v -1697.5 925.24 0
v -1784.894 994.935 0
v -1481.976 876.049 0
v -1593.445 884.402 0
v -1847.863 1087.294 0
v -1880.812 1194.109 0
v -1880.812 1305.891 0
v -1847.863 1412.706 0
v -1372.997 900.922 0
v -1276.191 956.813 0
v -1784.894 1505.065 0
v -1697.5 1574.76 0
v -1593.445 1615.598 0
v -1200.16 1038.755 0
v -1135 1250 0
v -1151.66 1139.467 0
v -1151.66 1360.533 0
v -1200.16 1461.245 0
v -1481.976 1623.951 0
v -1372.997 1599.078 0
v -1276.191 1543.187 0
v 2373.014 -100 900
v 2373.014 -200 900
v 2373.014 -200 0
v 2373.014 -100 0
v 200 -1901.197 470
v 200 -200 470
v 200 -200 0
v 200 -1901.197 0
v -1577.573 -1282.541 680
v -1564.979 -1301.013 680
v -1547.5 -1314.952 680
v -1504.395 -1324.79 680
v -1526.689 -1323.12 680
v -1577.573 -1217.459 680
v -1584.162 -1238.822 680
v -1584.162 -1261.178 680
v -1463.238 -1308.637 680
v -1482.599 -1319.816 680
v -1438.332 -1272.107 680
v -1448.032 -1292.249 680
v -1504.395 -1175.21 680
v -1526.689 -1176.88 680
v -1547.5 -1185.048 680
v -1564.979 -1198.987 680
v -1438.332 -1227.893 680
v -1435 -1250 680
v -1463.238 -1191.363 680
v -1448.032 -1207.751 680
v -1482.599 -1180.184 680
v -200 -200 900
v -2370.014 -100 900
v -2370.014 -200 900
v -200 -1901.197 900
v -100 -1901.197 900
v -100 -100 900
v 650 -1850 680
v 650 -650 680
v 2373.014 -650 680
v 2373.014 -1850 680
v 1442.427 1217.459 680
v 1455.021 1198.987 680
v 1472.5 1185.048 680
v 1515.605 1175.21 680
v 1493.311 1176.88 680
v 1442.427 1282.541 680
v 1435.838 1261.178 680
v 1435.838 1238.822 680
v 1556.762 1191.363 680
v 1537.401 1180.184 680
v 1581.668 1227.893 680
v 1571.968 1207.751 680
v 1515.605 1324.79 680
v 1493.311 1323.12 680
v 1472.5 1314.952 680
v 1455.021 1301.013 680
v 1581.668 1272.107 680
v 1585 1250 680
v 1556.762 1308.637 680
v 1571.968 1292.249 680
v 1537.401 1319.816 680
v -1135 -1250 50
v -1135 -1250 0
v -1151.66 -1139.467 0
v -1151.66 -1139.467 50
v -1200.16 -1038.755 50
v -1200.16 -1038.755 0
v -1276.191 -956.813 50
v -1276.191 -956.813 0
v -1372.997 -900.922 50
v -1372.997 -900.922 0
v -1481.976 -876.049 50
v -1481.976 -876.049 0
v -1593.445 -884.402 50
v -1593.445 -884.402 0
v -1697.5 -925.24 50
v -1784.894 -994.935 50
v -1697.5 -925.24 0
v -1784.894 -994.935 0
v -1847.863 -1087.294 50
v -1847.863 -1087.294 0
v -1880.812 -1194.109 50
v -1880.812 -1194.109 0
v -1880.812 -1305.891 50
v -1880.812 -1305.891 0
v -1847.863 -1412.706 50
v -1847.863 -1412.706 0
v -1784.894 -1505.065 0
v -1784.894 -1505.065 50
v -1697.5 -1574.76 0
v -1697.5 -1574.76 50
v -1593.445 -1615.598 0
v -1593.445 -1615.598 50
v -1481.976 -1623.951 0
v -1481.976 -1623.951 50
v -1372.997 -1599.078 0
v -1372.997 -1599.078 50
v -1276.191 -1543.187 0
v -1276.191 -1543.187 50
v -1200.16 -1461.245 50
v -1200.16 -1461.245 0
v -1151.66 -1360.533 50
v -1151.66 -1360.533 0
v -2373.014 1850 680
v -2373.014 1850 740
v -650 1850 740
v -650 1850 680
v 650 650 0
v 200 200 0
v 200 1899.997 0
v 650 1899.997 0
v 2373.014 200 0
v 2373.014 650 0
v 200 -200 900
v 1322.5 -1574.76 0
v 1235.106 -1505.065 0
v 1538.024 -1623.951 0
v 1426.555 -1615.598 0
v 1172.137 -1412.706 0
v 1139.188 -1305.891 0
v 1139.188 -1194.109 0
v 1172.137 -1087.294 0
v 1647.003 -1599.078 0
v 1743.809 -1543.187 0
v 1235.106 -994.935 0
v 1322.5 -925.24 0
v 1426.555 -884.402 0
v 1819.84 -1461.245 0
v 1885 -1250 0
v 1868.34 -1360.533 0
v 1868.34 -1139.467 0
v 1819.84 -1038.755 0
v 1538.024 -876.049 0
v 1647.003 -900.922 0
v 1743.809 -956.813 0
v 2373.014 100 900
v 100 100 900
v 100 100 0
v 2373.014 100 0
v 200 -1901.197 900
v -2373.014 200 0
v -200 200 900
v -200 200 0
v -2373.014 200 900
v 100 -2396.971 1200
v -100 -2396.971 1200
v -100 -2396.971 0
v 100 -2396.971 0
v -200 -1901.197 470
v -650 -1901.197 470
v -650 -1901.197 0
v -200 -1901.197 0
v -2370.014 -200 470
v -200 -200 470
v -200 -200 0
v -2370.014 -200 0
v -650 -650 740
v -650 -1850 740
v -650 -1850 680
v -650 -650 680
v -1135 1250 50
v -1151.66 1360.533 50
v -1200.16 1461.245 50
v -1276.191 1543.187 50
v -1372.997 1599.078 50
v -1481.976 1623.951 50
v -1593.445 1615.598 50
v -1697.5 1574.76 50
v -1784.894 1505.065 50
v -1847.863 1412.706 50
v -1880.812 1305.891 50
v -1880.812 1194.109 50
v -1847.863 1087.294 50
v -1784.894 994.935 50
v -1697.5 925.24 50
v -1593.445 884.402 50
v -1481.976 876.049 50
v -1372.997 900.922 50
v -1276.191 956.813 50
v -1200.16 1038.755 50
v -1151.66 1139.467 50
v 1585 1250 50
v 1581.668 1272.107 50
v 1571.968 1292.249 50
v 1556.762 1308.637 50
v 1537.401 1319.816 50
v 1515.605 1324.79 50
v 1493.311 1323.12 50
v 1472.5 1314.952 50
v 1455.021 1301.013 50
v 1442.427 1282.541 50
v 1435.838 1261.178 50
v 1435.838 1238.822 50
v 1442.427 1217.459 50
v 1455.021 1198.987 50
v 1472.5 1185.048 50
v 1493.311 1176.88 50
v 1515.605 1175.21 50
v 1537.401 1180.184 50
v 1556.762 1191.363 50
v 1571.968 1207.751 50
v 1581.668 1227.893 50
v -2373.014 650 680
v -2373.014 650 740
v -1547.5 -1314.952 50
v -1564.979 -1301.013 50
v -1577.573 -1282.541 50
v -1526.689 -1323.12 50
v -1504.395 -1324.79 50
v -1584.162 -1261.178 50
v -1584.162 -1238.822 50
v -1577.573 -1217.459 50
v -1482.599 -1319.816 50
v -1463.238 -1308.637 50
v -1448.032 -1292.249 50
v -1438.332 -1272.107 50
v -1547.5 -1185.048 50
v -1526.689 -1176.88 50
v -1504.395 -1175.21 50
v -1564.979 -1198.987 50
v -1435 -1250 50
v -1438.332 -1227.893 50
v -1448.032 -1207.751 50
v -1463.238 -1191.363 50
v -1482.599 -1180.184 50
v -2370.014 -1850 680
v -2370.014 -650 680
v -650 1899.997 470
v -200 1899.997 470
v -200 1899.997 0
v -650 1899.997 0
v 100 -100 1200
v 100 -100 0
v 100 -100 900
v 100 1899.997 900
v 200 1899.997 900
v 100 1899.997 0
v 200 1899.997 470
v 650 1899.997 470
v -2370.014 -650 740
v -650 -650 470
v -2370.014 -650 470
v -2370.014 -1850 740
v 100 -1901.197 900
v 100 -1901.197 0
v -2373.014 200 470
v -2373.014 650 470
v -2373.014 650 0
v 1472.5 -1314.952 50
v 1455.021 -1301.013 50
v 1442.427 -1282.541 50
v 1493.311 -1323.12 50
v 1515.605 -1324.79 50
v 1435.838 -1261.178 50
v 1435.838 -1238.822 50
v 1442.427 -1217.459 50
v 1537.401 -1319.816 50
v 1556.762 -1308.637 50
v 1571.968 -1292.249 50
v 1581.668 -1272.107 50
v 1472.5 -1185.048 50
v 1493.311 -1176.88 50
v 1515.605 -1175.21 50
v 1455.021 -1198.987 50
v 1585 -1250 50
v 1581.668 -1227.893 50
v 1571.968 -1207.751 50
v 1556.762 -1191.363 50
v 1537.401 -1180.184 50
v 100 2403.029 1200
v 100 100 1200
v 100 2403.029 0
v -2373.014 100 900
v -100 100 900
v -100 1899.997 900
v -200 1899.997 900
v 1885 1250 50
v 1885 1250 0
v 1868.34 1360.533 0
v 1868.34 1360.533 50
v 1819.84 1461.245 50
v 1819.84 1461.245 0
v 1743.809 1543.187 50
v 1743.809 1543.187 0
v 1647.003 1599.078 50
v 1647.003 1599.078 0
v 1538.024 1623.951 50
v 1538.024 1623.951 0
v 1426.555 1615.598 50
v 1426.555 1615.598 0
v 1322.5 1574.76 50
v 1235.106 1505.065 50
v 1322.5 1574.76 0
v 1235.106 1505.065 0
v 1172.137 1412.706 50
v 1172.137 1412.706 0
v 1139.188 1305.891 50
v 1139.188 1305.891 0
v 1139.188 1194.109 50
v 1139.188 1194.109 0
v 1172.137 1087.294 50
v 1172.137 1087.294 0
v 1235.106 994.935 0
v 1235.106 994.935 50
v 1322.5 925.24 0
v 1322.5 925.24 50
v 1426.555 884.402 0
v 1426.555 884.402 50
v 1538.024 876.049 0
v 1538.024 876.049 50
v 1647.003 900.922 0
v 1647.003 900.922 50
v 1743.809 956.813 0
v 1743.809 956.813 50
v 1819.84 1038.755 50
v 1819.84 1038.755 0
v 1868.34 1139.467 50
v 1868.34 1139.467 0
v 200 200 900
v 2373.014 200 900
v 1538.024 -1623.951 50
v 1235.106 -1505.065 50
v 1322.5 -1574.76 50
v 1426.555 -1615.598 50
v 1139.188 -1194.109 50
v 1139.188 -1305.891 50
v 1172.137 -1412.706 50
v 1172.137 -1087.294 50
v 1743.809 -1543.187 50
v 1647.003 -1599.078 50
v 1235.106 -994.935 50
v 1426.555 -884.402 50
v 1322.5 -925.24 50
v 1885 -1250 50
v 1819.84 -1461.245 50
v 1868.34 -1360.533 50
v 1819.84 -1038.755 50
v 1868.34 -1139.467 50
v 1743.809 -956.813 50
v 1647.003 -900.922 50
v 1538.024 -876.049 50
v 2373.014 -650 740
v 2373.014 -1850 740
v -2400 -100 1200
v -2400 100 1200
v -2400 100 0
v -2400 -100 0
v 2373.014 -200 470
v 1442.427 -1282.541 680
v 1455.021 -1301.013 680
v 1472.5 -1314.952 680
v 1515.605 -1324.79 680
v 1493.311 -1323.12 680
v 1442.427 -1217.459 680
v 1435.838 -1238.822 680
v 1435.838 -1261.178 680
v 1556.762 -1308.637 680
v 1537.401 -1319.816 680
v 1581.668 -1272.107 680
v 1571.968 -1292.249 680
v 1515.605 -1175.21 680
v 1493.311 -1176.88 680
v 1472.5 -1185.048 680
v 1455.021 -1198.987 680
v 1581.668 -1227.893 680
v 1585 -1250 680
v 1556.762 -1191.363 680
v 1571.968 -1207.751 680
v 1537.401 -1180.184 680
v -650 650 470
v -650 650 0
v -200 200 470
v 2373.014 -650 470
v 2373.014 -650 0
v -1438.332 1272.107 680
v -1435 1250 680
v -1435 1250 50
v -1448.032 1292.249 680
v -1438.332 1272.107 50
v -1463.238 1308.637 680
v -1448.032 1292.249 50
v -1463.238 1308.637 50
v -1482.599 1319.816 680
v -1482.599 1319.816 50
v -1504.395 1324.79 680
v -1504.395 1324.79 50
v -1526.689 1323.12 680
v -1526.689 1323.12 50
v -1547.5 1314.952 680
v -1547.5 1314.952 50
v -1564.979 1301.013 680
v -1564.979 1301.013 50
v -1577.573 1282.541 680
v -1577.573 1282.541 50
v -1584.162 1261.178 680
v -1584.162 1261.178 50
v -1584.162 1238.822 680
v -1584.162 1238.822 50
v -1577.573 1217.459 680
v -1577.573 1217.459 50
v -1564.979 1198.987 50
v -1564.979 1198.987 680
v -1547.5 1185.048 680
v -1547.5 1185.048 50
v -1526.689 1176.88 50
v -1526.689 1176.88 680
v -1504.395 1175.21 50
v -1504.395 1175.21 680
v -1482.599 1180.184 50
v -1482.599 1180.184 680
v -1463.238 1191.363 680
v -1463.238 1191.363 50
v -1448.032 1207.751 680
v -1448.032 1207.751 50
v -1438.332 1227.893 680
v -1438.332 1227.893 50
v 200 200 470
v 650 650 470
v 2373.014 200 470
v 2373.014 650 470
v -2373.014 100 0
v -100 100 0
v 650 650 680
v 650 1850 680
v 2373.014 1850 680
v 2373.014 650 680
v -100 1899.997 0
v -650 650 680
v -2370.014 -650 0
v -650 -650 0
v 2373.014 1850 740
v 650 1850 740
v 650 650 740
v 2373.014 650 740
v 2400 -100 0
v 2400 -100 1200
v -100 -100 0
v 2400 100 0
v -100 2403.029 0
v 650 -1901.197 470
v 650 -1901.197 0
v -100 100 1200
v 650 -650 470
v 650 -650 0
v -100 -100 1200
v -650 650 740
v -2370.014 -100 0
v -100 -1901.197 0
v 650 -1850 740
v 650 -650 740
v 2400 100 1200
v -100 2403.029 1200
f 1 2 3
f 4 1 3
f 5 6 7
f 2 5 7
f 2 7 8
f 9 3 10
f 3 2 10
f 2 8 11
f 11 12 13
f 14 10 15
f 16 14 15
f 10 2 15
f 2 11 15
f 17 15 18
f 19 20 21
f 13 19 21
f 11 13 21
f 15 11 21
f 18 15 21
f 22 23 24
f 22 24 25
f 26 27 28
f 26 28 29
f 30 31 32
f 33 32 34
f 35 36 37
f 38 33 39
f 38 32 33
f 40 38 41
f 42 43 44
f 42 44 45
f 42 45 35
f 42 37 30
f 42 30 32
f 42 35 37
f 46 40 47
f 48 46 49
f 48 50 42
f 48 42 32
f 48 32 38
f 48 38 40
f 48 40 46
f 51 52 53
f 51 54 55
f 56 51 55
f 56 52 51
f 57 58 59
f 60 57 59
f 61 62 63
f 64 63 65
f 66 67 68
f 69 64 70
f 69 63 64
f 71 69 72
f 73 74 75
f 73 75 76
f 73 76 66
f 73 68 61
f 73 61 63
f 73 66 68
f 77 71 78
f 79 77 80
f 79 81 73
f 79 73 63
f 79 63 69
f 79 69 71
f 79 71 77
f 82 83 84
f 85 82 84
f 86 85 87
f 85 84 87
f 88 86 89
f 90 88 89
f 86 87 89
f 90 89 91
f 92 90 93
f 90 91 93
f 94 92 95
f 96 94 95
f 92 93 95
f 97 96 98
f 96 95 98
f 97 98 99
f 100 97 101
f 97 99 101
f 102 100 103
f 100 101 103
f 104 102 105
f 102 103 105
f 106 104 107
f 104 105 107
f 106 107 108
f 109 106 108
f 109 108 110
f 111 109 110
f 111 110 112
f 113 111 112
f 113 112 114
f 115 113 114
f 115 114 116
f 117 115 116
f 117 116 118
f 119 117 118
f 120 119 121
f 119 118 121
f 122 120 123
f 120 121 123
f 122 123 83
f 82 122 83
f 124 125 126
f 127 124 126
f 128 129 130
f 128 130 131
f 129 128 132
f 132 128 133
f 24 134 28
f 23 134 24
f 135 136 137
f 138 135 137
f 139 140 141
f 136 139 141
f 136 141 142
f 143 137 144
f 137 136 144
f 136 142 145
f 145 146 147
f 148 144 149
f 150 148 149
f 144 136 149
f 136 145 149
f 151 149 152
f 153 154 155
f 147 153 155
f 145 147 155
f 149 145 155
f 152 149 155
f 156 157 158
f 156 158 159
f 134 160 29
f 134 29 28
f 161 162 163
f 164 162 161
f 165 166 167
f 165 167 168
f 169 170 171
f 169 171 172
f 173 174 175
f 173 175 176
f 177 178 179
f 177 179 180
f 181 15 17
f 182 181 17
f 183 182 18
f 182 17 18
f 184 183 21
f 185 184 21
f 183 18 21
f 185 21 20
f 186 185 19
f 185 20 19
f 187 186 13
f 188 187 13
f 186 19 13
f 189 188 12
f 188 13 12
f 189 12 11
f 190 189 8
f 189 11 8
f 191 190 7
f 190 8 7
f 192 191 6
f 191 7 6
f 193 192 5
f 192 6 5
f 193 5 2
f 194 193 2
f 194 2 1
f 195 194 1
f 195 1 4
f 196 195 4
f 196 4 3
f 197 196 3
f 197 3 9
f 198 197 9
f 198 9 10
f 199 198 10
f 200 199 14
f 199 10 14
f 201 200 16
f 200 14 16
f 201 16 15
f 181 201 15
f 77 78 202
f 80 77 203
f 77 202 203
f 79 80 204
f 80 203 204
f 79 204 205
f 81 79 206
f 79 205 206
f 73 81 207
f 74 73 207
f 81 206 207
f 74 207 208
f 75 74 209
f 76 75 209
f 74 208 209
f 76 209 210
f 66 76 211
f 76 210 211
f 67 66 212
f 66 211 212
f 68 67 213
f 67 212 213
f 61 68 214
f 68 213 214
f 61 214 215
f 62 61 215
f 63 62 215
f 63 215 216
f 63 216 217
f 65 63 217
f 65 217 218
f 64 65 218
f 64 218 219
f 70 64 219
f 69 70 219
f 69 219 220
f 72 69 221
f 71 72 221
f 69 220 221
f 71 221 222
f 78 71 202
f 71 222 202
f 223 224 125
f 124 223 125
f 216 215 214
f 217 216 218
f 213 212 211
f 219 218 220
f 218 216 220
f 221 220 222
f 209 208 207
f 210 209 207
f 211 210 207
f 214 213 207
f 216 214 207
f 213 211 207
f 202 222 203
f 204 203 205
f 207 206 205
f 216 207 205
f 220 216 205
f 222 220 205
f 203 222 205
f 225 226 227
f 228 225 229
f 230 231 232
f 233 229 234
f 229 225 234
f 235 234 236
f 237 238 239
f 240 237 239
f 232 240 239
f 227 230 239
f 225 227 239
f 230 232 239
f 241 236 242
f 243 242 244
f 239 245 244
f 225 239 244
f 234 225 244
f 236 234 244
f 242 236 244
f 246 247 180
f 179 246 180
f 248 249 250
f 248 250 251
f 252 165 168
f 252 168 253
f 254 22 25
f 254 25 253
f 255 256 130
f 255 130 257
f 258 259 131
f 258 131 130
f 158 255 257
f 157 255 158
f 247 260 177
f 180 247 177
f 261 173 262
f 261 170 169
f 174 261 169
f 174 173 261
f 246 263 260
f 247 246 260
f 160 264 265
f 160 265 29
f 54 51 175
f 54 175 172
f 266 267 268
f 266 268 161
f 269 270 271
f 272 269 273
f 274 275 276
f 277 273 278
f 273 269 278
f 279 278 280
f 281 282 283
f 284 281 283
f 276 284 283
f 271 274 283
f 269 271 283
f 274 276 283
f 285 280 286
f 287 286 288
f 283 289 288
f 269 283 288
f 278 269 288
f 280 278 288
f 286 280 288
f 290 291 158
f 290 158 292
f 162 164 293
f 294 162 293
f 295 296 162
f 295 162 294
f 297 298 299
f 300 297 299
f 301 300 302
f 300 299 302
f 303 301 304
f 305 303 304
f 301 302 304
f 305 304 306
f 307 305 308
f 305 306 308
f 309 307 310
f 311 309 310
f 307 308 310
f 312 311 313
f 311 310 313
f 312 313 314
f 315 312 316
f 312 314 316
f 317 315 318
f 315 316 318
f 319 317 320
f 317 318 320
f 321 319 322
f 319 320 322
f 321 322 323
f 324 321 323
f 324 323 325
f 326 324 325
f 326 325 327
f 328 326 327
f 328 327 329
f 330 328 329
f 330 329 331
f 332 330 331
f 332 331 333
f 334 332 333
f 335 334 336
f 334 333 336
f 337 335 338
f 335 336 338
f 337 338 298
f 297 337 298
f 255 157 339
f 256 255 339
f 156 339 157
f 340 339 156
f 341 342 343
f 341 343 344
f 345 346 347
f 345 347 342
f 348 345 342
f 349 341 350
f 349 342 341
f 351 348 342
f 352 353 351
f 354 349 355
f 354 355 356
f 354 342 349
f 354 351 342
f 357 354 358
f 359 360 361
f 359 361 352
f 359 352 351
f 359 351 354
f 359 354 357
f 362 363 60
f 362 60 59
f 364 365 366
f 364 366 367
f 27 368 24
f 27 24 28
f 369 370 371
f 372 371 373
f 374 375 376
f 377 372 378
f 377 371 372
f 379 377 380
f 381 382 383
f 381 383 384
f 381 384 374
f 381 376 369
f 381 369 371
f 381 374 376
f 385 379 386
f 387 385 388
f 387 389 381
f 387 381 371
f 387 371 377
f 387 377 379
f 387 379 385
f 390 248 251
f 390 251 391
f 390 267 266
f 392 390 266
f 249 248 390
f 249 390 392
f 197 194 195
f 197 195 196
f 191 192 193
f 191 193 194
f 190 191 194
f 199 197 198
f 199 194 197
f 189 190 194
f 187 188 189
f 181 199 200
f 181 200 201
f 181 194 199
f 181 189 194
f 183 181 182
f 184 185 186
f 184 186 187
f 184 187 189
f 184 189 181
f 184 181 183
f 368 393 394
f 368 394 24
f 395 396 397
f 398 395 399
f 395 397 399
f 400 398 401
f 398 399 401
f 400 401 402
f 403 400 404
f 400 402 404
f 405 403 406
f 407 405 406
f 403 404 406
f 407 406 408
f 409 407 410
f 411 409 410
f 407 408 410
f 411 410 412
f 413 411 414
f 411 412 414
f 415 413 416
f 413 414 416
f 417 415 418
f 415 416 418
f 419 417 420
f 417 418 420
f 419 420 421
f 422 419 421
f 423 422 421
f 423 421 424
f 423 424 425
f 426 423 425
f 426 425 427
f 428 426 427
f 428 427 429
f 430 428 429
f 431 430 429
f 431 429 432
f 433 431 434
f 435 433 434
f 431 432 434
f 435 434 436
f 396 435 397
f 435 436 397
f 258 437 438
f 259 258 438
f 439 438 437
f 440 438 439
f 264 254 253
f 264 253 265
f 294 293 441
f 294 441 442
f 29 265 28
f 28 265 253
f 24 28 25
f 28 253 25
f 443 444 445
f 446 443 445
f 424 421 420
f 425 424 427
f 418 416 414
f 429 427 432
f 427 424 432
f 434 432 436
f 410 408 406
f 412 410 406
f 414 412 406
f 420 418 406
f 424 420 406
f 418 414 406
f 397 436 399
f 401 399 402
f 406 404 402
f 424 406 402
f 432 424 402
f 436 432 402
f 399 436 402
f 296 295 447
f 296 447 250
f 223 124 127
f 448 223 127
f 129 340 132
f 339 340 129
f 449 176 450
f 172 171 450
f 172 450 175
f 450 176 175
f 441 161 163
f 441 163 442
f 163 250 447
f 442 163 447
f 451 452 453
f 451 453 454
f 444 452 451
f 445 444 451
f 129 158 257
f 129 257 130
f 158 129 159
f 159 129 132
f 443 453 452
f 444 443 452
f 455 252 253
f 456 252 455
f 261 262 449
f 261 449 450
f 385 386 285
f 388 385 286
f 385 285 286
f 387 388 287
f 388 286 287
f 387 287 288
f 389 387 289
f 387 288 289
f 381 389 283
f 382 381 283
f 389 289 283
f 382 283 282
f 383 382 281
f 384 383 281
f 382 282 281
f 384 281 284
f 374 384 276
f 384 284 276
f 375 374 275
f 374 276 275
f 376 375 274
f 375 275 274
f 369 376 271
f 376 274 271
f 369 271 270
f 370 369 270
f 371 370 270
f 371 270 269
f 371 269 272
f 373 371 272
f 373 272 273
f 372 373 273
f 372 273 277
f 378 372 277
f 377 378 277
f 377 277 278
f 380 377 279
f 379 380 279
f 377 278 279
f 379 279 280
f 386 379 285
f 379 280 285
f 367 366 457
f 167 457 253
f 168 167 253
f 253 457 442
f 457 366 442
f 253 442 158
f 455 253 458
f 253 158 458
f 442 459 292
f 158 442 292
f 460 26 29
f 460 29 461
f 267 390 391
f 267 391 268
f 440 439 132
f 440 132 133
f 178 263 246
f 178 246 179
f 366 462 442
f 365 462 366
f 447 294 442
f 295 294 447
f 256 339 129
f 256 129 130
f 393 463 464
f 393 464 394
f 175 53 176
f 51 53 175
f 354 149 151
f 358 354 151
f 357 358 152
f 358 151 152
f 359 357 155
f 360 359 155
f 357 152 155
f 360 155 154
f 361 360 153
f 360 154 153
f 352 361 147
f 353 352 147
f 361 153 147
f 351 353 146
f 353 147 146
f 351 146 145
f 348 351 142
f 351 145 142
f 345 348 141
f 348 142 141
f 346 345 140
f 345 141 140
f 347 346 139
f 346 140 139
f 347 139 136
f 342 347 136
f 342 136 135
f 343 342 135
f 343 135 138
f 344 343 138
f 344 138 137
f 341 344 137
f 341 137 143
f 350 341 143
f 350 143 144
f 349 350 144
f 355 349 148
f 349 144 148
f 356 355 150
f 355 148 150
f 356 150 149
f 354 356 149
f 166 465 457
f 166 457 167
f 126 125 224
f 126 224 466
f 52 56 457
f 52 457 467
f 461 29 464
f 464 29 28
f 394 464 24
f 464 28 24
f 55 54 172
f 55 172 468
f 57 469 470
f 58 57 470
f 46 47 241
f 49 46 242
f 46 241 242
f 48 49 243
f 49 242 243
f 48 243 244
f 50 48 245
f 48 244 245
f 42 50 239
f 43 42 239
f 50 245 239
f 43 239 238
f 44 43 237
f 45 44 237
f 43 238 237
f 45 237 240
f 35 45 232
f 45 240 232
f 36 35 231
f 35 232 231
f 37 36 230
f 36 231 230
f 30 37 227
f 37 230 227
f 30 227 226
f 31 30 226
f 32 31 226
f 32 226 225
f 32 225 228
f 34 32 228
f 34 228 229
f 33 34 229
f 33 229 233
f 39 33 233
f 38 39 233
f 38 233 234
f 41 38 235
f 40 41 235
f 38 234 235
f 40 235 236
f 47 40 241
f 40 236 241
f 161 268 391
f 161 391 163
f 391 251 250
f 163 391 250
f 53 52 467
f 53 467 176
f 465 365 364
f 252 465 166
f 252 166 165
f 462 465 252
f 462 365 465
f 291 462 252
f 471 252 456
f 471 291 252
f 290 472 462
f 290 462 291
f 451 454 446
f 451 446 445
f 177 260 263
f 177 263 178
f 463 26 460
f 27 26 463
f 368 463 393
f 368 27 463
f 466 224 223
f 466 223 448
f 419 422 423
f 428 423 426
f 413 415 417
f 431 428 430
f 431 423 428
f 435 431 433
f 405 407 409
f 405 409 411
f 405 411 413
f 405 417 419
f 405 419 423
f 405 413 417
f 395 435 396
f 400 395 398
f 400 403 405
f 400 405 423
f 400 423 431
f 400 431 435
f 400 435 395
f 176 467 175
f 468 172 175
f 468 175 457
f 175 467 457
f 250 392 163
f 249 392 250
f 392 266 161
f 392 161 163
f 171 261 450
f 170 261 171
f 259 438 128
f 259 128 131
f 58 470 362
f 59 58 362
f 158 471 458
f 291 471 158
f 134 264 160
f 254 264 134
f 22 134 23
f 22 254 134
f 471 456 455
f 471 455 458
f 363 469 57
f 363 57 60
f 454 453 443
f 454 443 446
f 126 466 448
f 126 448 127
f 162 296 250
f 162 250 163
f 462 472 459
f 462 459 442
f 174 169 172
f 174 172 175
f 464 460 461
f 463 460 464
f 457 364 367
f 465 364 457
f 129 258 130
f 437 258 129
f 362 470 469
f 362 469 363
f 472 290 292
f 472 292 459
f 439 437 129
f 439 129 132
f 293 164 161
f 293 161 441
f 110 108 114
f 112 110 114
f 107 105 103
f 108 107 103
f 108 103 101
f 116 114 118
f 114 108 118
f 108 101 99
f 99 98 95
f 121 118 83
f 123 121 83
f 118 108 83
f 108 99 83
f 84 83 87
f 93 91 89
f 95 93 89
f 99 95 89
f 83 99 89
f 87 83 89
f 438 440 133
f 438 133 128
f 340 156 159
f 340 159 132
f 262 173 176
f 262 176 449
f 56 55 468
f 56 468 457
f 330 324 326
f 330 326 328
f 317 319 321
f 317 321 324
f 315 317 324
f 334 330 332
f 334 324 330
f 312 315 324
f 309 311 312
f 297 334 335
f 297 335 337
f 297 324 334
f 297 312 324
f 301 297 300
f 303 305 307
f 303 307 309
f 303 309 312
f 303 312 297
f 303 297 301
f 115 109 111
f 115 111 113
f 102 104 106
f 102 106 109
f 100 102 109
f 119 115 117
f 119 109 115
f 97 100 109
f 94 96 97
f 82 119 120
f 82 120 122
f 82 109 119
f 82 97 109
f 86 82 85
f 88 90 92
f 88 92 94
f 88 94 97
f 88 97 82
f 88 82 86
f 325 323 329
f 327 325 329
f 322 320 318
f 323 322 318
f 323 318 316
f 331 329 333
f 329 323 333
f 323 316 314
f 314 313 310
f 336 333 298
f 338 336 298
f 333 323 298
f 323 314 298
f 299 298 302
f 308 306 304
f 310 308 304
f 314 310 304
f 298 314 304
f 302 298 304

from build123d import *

# Parameters (mm, degrees)
F6_DEPTH  = 470
F8_DEPTH  = 1200
F10_DEPTH = 900
F12_W     = 1723.014453
F12_H     = 1200
F12_W_2   = 1720.014453
F13_DEPTH = 60
F14_R     = 375
F15_DEPTH = 50
F16_R     = 75
F17_DEPTH = 630


with BuildPart() as f6:
    # F5 (on offset) → F6 (new body)
    with BuildSketch(Plane.XY.offset(470)):
        Polygon((-650, 650), (-2373.014453, 650), (-2373.014453, 200), (-200, 200), (-200, 1899.996675), (-650, 1899.996675), align=None)
        Polygon((650, 650), (650, 1899.996675), (200, 1899.996675), (200, 200), (2373.014453, 200), (2373.014453, 650), align=None)
        Polygon((-200, -1901.196675), (-200, -200), (-2370.014453, -200), (-2370.014453, -650), (-650, -650), (-650, -1901.196675), align=None)
        Polygon((200, -1901.196675), (650, -1901.196675), (650, -650), (2373.014453, -650), (2373.014453, -200), (200, -200), align=None)
    extrude(amount=-F6_DEPTH)


with BuildPart() as f8:
    # F7 (on offset) → F8 (new body)
    with BuildSketch(Plane.XY.offset(1200)):
        Polygon((100, 2403.028913), (-100, 2403.028913), (-100, 100), (-2400, 100), (-2400, -100), (-100, -100), (-100, -2396.971087), (100, -2396.971087), (100, -100), (2400, -100), (2400, 100), (100, 100), align=None)
    extrude(amount=-F8_DEPTH)


with BuildPart() as f10:
    # F9 (on offset) → F10 (new body)
    with BuildSketch(Plane.XY.offset(900)):
        Polygon((-100, -100), (-2370.014453, -100), (-2370.014453, -200), (-200, -200), (-200, -1901.196675), (-100, -1901.196675), align=None)
        Polygon((100, -1901.196675), (200, -1901.196675), (200, -200), (2373.014453, -200), (2373.014453, -100), (100, -100), align=None)
        Polygon((-100, 1899.996675), (-200, 1899.996675), (-200, 200), (-2373.014453, 200), (-2373.014453, 100), (-100, 100), align=None)
        Polygon((200, 200), (200, 1899.996675), (100, 1899.996675), (100, 100), (2373.014453, 100), (2373.014453, 200), align=None)
    extrude(amount=-F10_DEPTH)


with BuildPart() as f13:
    # F12 (on offset) → F13 (new body)
    with BuildSketch(Plane.XY.offset(740)):
        with Locations((-1511.507226, 1250)):
            Rectangle(F12_W, F12_H)
        with Locations((-1510.007226, -1250)):
            Rectangle(F12_W_2, F12_H)
        with Locations((1511.507226, -1250)):
            Rectangle(F12_W, F12_H)
        with Locations((1511.507226, 1250)):
            Rectangle(F12_W, F12_H)
    extrude(amount=-F13_DEPTH)


with BuildPart() as f15:
    # F14 (on Top) → F15 (new body)
    with BuildSketch(Plane.XY):
        with Locations((-1510, 1250)):
            Circle(F14_R)
        with Locations((-1510, -1250)):
            Circle(F14_R)
        with Locations((1510, 1250)):
            Circle(F14_R)
        with Locations((1510, -1250)):
            Circle(F14_R)
    extrude(amount=F15_DEPTH)


with BuildPart() as f17:
    # F16 (on face) → F17 (new body, through all)
    with BuildSketch(Plane.XY.offset(50)):
        with Locations((-1510, 1250)):
            Circle(F16_R)
        with Locations((1510, 1250)):
            Circle(F16_R)
        with Locations((-1510, -1250)):
            Circle(F16_R)
        with Locations((1510, -1250)):
            Circle(F16_R)
    extrude(amount=F17_DEPTH)


solid = Compound([f6.part, f8.part, f10.part, f13.part, f15.part, f17.part])
